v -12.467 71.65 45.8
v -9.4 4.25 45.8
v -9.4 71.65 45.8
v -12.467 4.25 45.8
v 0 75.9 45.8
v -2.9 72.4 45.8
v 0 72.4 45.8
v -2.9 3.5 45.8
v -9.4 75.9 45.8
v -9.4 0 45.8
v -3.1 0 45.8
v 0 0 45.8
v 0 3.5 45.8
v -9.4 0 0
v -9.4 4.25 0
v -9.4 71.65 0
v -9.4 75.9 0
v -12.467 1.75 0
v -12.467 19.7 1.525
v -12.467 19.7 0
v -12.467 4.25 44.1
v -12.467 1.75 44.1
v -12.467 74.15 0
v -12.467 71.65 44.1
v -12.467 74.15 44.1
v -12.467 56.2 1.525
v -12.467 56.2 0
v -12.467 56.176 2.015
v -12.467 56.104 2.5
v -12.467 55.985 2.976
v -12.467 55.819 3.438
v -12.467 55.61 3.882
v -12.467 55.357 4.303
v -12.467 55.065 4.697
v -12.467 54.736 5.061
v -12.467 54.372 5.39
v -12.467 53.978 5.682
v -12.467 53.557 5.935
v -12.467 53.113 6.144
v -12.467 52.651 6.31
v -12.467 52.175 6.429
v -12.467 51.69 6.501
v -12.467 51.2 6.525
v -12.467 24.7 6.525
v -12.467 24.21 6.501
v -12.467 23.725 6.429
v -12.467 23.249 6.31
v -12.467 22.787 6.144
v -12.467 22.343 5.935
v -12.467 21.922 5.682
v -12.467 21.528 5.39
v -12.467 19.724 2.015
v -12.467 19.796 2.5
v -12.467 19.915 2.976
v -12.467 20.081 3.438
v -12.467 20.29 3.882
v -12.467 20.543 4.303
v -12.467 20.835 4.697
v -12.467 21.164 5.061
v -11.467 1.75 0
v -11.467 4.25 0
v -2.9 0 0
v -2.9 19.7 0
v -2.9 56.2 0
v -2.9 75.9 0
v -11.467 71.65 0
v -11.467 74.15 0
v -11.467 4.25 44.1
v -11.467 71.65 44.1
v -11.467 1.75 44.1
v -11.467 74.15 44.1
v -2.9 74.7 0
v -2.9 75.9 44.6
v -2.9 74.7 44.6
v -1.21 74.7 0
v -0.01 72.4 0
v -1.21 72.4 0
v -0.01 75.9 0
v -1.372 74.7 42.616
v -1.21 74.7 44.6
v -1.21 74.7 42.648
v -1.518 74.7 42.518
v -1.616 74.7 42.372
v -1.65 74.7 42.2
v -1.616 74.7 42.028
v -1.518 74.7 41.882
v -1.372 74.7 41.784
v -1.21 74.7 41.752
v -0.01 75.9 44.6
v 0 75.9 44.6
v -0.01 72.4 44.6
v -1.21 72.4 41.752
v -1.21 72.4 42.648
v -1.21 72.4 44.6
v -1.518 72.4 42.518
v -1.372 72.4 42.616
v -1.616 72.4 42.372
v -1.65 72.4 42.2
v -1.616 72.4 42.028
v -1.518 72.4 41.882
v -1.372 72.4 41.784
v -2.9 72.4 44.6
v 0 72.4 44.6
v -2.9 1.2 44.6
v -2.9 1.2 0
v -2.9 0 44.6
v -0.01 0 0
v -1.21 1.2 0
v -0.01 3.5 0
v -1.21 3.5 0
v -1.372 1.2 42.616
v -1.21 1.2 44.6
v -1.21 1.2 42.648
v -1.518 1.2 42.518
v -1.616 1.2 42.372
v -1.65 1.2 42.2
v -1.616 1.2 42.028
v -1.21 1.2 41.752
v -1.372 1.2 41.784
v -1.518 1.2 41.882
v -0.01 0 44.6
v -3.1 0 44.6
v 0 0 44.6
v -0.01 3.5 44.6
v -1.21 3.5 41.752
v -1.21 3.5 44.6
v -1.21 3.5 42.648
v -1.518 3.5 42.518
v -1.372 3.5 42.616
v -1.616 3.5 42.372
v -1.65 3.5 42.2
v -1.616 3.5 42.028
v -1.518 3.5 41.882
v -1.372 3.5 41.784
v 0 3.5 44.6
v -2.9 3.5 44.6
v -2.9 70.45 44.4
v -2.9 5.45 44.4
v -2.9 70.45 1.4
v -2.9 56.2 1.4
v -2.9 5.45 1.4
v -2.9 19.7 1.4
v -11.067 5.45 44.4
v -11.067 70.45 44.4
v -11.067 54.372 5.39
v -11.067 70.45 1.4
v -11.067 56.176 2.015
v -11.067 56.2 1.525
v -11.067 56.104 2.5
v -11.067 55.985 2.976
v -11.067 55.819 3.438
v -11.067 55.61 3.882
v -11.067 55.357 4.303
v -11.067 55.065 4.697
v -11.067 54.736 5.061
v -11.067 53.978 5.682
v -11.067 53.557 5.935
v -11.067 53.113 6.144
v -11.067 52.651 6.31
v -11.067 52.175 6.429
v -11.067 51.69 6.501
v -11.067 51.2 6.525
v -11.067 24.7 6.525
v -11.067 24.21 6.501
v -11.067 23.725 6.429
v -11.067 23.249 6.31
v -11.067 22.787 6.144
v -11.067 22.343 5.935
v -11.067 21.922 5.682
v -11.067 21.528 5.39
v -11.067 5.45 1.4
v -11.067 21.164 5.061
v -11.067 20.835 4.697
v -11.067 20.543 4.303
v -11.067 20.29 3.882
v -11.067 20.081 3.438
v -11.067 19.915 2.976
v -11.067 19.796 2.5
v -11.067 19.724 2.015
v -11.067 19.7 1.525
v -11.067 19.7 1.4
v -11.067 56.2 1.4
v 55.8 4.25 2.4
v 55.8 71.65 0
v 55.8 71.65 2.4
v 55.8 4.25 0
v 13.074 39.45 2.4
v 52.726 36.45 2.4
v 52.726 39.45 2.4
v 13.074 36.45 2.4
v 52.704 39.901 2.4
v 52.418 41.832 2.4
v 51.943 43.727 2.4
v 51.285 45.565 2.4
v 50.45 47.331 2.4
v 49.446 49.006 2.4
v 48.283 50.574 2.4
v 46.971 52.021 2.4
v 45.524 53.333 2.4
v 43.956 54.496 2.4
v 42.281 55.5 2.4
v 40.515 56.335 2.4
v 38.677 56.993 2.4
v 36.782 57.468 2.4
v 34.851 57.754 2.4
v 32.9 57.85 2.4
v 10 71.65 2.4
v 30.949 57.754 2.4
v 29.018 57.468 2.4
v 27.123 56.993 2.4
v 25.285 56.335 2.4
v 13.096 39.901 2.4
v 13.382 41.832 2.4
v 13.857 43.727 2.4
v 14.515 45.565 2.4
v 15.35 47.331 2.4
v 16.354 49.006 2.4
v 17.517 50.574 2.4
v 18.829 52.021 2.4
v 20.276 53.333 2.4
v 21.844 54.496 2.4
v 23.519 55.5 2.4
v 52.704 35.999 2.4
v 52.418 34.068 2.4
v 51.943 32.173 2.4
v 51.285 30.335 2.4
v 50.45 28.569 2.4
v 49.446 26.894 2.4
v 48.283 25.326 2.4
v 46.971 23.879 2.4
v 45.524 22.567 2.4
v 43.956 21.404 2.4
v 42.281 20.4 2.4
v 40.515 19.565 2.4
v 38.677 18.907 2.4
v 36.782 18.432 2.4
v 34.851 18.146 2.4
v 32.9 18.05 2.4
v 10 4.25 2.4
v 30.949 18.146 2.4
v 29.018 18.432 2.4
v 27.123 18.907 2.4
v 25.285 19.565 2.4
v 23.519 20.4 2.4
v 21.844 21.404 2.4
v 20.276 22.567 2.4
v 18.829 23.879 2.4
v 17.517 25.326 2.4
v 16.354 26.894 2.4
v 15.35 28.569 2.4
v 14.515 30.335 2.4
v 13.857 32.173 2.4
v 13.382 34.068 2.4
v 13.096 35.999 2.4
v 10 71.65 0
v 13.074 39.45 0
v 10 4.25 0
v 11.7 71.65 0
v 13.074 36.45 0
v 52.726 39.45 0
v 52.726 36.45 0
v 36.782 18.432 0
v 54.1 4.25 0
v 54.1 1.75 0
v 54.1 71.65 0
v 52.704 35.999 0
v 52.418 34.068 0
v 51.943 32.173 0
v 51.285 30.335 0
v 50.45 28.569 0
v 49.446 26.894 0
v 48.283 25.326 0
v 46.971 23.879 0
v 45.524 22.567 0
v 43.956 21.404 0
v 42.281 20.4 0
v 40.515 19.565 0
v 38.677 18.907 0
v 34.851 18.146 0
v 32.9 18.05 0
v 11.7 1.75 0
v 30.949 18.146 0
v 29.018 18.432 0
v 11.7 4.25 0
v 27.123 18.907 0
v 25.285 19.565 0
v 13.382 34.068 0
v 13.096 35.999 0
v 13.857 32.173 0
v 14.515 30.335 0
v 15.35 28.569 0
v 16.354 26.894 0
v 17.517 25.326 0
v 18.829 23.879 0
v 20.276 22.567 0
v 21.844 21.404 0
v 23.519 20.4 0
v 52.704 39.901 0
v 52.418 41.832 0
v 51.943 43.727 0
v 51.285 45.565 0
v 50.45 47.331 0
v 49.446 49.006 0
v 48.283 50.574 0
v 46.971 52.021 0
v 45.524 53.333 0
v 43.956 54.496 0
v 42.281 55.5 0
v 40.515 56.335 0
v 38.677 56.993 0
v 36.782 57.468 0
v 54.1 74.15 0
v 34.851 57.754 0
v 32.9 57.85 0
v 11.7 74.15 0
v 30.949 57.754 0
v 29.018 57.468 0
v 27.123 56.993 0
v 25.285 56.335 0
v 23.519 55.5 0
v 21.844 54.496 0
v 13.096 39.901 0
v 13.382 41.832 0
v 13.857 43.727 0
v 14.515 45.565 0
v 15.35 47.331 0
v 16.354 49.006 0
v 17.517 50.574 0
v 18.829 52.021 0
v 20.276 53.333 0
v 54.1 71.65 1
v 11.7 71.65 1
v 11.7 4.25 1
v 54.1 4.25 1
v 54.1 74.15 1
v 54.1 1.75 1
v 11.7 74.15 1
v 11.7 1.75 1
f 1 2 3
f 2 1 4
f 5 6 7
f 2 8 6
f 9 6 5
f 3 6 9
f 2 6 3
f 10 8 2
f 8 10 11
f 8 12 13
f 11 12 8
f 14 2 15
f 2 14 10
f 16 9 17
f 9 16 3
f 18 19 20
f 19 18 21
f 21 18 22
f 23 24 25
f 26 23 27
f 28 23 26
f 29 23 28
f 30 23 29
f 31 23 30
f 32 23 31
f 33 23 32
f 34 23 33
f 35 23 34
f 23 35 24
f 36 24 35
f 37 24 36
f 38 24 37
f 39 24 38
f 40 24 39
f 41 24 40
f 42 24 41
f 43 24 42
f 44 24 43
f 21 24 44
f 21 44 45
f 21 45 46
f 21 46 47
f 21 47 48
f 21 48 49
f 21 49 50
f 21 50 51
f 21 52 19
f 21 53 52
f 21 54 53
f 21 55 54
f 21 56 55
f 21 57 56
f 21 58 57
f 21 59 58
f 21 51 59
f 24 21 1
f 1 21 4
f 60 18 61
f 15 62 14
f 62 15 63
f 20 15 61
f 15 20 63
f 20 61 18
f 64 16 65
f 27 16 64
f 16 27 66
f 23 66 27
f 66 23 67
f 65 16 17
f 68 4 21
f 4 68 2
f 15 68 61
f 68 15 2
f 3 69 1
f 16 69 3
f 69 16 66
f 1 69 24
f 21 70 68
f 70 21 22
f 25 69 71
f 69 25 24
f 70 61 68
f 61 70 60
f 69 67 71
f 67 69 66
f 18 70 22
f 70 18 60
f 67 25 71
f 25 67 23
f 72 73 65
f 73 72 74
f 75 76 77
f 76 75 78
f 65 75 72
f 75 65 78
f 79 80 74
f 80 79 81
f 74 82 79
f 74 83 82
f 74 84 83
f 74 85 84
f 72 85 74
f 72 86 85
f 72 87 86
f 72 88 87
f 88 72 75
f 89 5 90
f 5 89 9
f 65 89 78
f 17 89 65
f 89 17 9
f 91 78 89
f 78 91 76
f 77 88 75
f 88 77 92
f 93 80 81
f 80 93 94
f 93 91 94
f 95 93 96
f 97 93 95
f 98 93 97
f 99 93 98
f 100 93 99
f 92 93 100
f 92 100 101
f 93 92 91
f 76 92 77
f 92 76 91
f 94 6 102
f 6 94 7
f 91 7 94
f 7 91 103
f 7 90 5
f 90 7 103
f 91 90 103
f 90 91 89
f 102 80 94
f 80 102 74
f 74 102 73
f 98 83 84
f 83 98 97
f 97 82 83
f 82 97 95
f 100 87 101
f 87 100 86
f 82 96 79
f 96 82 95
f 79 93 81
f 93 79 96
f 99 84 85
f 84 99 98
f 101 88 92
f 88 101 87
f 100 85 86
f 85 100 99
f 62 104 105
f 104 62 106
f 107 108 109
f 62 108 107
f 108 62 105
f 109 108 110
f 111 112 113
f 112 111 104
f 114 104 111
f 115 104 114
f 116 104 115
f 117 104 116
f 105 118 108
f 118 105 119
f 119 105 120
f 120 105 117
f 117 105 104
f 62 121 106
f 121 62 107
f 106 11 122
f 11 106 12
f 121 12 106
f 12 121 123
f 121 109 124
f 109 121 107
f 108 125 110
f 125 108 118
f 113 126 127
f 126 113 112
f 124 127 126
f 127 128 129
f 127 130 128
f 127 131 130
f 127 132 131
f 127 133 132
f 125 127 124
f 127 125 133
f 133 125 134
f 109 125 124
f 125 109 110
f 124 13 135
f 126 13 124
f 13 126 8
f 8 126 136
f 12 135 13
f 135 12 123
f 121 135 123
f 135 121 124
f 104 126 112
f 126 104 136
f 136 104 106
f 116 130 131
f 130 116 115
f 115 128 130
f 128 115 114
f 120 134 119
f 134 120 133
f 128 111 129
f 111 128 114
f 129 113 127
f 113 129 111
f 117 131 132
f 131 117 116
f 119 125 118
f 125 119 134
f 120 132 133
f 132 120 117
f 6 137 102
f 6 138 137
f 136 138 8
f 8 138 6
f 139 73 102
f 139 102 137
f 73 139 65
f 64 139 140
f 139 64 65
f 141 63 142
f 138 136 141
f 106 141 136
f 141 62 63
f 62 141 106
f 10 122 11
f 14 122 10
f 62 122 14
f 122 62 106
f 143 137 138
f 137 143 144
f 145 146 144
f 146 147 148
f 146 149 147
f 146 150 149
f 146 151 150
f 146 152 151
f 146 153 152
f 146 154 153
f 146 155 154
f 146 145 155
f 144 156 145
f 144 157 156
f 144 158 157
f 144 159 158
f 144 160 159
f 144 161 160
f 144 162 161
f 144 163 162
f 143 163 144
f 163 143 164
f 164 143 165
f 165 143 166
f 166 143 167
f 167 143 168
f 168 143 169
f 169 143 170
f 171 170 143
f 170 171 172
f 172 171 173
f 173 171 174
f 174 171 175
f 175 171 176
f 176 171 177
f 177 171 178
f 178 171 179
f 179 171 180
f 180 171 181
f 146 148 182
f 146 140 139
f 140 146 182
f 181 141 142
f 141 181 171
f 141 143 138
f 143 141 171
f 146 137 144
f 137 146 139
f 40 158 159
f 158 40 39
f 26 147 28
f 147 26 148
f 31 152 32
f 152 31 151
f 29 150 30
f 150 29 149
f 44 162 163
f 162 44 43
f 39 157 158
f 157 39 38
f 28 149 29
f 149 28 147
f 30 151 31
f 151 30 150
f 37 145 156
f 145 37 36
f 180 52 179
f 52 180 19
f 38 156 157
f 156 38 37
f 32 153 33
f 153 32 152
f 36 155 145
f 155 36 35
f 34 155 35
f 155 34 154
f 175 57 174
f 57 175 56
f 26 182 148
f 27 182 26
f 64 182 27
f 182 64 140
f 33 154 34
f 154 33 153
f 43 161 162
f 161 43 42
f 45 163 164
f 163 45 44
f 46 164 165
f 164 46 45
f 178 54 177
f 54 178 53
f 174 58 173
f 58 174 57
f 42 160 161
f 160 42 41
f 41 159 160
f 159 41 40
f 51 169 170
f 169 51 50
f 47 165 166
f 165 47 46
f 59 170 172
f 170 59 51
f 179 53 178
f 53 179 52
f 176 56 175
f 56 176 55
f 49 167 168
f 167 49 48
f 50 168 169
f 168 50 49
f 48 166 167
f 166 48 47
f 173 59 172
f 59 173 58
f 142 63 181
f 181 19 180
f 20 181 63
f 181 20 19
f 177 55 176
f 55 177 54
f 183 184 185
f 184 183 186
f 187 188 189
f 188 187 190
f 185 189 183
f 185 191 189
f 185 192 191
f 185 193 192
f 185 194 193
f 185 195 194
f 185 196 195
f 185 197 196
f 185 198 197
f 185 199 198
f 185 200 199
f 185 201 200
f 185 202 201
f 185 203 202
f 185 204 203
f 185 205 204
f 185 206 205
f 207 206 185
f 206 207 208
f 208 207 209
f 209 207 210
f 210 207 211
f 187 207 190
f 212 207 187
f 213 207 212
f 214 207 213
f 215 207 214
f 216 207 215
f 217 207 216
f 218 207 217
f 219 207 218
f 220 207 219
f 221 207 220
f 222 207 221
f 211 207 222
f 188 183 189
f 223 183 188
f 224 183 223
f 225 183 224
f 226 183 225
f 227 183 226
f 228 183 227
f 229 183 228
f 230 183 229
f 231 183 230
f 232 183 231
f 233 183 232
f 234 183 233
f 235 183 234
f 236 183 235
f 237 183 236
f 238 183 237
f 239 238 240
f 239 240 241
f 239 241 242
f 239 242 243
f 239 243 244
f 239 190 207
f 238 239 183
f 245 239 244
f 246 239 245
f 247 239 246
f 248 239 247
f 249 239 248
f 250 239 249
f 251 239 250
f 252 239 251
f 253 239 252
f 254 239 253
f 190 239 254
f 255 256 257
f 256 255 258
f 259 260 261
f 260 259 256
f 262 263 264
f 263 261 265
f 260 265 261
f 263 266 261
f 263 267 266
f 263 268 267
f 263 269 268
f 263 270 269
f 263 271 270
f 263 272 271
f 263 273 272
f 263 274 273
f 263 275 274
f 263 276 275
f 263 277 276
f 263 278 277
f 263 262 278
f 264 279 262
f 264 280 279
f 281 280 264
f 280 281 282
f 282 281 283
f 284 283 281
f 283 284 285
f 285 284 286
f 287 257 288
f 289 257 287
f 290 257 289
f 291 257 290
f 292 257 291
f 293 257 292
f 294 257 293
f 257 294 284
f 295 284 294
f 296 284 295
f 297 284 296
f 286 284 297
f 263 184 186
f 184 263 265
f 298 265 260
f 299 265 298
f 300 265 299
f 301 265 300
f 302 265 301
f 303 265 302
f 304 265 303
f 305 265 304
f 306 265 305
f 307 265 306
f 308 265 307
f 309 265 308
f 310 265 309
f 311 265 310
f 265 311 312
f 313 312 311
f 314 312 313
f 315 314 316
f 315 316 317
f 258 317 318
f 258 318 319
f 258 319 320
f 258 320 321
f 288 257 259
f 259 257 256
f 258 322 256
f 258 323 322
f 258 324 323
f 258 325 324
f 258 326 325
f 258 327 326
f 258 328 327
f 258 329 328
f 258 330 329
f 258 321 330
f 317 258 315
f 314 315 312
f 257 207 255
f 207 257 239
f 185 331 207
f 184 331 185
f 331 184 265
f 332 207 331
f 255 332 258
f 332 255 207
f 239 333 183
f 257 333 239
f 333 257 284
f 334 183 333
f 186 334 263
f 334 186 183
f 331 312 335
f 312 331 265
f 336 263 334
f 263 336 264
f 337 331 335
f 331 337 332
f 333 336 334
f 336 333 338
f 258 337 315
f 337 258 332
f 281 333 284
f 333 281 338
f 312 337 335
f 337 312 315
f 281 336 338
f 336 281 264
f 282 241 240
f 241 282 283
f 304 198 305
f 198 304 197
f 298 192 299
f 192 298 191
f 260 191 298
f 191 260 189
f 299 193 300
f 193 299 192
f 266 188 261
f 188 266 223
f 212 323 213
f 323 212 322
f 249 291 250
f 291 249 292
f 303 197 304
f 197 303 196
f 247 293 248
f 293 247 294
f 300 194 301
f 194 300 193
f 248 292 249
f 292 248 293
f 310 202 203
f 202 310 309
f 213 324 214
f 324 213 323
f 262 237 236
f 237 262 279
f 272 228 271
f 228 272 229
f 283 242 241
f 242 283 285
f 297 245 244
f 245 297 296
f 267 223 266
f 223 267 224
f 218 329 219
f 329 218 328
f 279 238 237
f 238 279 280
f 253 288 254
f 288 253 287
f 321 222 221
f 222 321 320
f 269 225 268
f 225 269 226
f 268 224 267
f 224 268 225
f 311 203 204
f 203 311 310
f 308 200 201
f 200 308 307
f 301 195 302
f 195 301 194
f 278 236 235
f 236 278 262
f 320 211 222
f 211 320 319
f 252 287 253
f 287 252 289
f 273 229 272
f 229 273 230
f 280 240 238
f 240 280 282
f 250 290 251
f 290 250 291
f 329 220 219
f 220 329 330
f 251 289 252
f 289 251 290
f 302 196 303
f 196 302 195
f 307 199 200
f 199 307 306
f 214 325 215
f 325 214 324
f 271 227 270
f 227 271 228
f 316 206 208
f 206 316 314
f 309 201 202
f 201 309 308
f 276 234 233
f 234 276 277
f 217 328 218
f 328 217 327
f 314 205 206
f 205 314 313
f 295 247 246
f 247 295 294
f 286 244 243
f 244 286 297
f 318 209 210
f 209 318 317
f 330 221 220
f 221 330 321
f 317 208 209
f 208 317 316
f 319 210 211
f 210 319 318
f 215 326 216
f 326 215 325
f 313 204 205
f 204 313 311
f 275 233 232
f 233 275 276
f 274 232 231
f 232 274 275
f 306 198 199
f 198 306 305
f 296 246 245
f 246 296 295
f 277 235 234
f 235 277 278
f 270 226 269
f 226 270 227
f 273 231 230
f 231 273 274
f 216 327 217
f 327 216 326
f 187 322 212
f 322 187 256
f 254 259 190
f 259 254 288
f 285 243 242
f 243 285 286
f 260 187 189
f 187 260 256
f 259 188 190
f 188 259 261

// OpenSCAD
// [FL_INDEX: keywords="openscad, 3d_parametric, Customizable_Board_Game_Card_Storage, csg_solid" | COT="Parametric OpenSCAD design from 3DCodeverse"]
// Title: Customizable Board Game Card Storage

/*
 * Author:  Jean Philippe Neumann
 * License: Creative Commons Attribution-ShareAlike 3.0 Unported License
 *          see http://creativecommons.org/licenses/by-sa/3.0/
 * URL:     http://www.thingiverse.com/thing:94611
 */
 
// MakerBot customizer settings:
// preview[view:south east, tilt:top diagonal]

/*
 * parameters
 */

/* [primary parameters] */

// how many card holders to print
numberOfHolders = 1;
// how many lids to print
numberOfLids = 1;

// the length of your cards in mm
cardY = 63;
// the width of your cards in mm
cardX = 41;
// the height of the stack of cards you want to store in mm
cardStackZ = 6;

// The fudge factor allows fine tuning the distances between parts in the lock and key mechanisms of the holder. The right value is highly dependent on your printer. Is everything fitting too tight? Try increasing the factor by 0.1. Is everything fitting too loose? Try decreasing the factor by 0.1.
fudgeFactor = 0.5;

/* [secondary parameters] */

longWallStrength = 1.4;
shortWallStrength = 1.2;
bottomWallStrength = 1.4;

// thickness of the lower part of the lock mechanism
lowerLockY = 1.2;
// height of the lower part of the lock mechanism
lowerLockZ = 1.7;
// thickness of the upper part of the lock mechanism
upperLockY = 3.5;
// height of the upper part of the lock mechanism
upperLockZ = 1.2;
// how high is the part of the lid that slides in the locks rail
keyRailZLid = 1.0;
// how high is the part of the holders body that slides in the locks rail
keyRailZBody = 1.0;

// how thick the bit of plastic is that blocks the end of the lock's rail
stopBitStrength = 1.2;
// the "lock nub" is a tiny bump near the end of the lock's rail that makes other holders or lids snap in. This variable sets the size of that nub.
lockNubRadius = 0.45;
// position of the "lock nub"
lockNubDistanceToCorner = 3*stopBitStrength;

// how much extra space to leave around cards
spaceAroundCard = 1;
// how strong the lid's grip is
lidGripStrength = 3;
// how alrge the hole in the lid is
lidHoleRadius = (cardX + 2*spaceAroundCard + 2*longWallStrength)/2 - lidGripStrength;

// distance between objects on the print bed
printDistance = 10;

/* derived parameters */
/* [Hidden] */

release = 1;

// holder main body parameters
bodyX = cardX + 2*spaceAroundCard + 2*longWallStrength;
bodyY = cardY + 2*spaceAroundCard + 2*shortWallStrength + 2*upperLockY + 3*fudgeFactor;
bodyZ = cardStackZ + spaceAroundCard/2;

// lock, key and lid parameters
lockZ = lowerLockZ + upperLockZ;
keyZ = lowerLockZ + upperLockZ + fudgeFactor/3;
lidZ = lowerLockZ + upperLockZ - fudgeFactor;
keyRailX = bodyX - 2*stopBitStrength - 2*fudgeFactor;
keyRailY = upperLockY - lowerLockY + 0.7 - fudgeFactor;
keyMainY = cardY + 2*spaceAroundCard + 2*shortWallStrength;

// space around the card stack
cardSpaceX = cardX + 2*spaceAroundCard;
cardSpaceY = cardY + 2*spaceAroundCard;

// hole in the side of the holder
grabHoleX = longWallStrength + cardX/8;
grabHoleY = cardY * 1/2;

// misc 
holderZ = bodyZ + keyZ + lockZ;

/*
 * putting it all together
 */

if(numberOfHolders != 0) {
	for(i=[0:numberOfHolders-1]) {
		translate([-i*(printDistance + holderZ),0,0])
		
		if(release == 1) {
			translate([-holderZ, bodyY, 0])
			rotate([0,-90,180])
			holder();
		} else {
			translate([-bodyX, 0, 0])
			holder();
		}
	}
}

if(numberOfLids != 0) {
	for(i=[0:numberOfLids-1]) {
		translate([i*(printDistance + bodyX) + printDistance,0,0])
		lid();
	}
}

/*
 * modules
 */

module lid() {
	union() {
		difference() {
			key(bodyX, keyMainY, lidZ, keyRailX, keyRailY, keyRailZLid, true);
			
			translate([bodyX/2, bodyY/2, -1])
			cylinder(h=lidZ+2, r=lidHoleRadius, $fn=64);
		}
		translate([0, (bodyY-lidGripStrength)/2,0])
		cube([bodyX, lidGripStrength ,lidZ]);
	}
}

module key(mainX, mainY, mainZ, railX, railY, railZ, lidMode) {
	railPartY = 2*railY + mainY;
	
	translate([(bodyX-mainX)/2, (bodyY-mainY)/2,0])
	union() {
		color([0.5,0.7,0.9])
		cube([mainX, mainY, mainZ]);
		
		color([0.7,0.7,0.9])
		translate([(mainX-railX)/2,(mainY-railPartY)/2,0])
		cube([railX, railPartY, railZ]);
		
		if(lidMode == false) {
			color([1,0,0])
			translate([0, -(railPartY-mainY)/2, 0])
			cube([(mainX-railX)/2,railPartY,railZ]);
		}
	}
}

module holder() {
	difference() {
		union() {
			key(bodyX, keyMainY, keyZ, keyRailX, keyRailY, keyRailZBody, false);
			
			translate([0,0,keyZ])
			cube([bodyX, bodyY, bodyZ]);
			
			translate([0,0,bodyZ+keyZ])
			lock(bodyX, lowerLockY, lowerLockZ, upperLockY, upperLockZ);
		}
		cardSpace();
		grabHole();
	}
}

module cardSpace() {
	color([1,0,0])
	translate([(bodyX-cardSpaceX)/2,(bodyY-cardSpaceY)/2,bottomWallStrength])
	cube([cardSpaceX, cardSpaceY, bodyZ+keyZ+bottomWallStrength]);
}

module grabHole() {
	cylinderRadius = 5;
	cubeX = grabHoleX-cylinderRadius;
	cubeY = grabHoleY-cylinderRadius;
	posY = (bodyY-cubeY)/2;
	
	$fn=64;
	translate([0, posY, -1])
	minkowski() {
		cube([cubeX, cubeY, bodyZ+keyZ+2]);
		cylinder(r=cylinderRadius, h=1);
	}
}

module lock() {
	union() {
		lockPart();
		mirror([0,1,0]) {
			translate([0,-bodyY,0])
			lockPart();
		}
	}
}

module lockPart() {
	union() {
		// lower lock
		color([0.9,0.4,0.3])
		cube([bodyX, lowerLockY, lowerLockZ]);
		
		// upper lock
		// subtracting 0.01 because of strange holes in the generated STL file
		translate([0,0,lowerLockZ-0.01])
		cube([bodyX, upperLockY, upperLockZ]);
		
		// stop bit
		color([0,1,0])
		// extra large lock bit / translate -Z because of strange holes in the generated STL file
		translate([bodyX-stopBitStrength, 0, -0.2])
		cube([stopBitStrength, upperLockY, lockZ+0.2]);
		
		// safety nub
		color([1,0,0])
		translate([bodyX-lockNubDistanceToCorner, upperLockY, lowerLockZ])
		rotate([90,0,0])
		cylinder(r=lockNubRadius, h=upperLockY, $fn=16);
	}
}
